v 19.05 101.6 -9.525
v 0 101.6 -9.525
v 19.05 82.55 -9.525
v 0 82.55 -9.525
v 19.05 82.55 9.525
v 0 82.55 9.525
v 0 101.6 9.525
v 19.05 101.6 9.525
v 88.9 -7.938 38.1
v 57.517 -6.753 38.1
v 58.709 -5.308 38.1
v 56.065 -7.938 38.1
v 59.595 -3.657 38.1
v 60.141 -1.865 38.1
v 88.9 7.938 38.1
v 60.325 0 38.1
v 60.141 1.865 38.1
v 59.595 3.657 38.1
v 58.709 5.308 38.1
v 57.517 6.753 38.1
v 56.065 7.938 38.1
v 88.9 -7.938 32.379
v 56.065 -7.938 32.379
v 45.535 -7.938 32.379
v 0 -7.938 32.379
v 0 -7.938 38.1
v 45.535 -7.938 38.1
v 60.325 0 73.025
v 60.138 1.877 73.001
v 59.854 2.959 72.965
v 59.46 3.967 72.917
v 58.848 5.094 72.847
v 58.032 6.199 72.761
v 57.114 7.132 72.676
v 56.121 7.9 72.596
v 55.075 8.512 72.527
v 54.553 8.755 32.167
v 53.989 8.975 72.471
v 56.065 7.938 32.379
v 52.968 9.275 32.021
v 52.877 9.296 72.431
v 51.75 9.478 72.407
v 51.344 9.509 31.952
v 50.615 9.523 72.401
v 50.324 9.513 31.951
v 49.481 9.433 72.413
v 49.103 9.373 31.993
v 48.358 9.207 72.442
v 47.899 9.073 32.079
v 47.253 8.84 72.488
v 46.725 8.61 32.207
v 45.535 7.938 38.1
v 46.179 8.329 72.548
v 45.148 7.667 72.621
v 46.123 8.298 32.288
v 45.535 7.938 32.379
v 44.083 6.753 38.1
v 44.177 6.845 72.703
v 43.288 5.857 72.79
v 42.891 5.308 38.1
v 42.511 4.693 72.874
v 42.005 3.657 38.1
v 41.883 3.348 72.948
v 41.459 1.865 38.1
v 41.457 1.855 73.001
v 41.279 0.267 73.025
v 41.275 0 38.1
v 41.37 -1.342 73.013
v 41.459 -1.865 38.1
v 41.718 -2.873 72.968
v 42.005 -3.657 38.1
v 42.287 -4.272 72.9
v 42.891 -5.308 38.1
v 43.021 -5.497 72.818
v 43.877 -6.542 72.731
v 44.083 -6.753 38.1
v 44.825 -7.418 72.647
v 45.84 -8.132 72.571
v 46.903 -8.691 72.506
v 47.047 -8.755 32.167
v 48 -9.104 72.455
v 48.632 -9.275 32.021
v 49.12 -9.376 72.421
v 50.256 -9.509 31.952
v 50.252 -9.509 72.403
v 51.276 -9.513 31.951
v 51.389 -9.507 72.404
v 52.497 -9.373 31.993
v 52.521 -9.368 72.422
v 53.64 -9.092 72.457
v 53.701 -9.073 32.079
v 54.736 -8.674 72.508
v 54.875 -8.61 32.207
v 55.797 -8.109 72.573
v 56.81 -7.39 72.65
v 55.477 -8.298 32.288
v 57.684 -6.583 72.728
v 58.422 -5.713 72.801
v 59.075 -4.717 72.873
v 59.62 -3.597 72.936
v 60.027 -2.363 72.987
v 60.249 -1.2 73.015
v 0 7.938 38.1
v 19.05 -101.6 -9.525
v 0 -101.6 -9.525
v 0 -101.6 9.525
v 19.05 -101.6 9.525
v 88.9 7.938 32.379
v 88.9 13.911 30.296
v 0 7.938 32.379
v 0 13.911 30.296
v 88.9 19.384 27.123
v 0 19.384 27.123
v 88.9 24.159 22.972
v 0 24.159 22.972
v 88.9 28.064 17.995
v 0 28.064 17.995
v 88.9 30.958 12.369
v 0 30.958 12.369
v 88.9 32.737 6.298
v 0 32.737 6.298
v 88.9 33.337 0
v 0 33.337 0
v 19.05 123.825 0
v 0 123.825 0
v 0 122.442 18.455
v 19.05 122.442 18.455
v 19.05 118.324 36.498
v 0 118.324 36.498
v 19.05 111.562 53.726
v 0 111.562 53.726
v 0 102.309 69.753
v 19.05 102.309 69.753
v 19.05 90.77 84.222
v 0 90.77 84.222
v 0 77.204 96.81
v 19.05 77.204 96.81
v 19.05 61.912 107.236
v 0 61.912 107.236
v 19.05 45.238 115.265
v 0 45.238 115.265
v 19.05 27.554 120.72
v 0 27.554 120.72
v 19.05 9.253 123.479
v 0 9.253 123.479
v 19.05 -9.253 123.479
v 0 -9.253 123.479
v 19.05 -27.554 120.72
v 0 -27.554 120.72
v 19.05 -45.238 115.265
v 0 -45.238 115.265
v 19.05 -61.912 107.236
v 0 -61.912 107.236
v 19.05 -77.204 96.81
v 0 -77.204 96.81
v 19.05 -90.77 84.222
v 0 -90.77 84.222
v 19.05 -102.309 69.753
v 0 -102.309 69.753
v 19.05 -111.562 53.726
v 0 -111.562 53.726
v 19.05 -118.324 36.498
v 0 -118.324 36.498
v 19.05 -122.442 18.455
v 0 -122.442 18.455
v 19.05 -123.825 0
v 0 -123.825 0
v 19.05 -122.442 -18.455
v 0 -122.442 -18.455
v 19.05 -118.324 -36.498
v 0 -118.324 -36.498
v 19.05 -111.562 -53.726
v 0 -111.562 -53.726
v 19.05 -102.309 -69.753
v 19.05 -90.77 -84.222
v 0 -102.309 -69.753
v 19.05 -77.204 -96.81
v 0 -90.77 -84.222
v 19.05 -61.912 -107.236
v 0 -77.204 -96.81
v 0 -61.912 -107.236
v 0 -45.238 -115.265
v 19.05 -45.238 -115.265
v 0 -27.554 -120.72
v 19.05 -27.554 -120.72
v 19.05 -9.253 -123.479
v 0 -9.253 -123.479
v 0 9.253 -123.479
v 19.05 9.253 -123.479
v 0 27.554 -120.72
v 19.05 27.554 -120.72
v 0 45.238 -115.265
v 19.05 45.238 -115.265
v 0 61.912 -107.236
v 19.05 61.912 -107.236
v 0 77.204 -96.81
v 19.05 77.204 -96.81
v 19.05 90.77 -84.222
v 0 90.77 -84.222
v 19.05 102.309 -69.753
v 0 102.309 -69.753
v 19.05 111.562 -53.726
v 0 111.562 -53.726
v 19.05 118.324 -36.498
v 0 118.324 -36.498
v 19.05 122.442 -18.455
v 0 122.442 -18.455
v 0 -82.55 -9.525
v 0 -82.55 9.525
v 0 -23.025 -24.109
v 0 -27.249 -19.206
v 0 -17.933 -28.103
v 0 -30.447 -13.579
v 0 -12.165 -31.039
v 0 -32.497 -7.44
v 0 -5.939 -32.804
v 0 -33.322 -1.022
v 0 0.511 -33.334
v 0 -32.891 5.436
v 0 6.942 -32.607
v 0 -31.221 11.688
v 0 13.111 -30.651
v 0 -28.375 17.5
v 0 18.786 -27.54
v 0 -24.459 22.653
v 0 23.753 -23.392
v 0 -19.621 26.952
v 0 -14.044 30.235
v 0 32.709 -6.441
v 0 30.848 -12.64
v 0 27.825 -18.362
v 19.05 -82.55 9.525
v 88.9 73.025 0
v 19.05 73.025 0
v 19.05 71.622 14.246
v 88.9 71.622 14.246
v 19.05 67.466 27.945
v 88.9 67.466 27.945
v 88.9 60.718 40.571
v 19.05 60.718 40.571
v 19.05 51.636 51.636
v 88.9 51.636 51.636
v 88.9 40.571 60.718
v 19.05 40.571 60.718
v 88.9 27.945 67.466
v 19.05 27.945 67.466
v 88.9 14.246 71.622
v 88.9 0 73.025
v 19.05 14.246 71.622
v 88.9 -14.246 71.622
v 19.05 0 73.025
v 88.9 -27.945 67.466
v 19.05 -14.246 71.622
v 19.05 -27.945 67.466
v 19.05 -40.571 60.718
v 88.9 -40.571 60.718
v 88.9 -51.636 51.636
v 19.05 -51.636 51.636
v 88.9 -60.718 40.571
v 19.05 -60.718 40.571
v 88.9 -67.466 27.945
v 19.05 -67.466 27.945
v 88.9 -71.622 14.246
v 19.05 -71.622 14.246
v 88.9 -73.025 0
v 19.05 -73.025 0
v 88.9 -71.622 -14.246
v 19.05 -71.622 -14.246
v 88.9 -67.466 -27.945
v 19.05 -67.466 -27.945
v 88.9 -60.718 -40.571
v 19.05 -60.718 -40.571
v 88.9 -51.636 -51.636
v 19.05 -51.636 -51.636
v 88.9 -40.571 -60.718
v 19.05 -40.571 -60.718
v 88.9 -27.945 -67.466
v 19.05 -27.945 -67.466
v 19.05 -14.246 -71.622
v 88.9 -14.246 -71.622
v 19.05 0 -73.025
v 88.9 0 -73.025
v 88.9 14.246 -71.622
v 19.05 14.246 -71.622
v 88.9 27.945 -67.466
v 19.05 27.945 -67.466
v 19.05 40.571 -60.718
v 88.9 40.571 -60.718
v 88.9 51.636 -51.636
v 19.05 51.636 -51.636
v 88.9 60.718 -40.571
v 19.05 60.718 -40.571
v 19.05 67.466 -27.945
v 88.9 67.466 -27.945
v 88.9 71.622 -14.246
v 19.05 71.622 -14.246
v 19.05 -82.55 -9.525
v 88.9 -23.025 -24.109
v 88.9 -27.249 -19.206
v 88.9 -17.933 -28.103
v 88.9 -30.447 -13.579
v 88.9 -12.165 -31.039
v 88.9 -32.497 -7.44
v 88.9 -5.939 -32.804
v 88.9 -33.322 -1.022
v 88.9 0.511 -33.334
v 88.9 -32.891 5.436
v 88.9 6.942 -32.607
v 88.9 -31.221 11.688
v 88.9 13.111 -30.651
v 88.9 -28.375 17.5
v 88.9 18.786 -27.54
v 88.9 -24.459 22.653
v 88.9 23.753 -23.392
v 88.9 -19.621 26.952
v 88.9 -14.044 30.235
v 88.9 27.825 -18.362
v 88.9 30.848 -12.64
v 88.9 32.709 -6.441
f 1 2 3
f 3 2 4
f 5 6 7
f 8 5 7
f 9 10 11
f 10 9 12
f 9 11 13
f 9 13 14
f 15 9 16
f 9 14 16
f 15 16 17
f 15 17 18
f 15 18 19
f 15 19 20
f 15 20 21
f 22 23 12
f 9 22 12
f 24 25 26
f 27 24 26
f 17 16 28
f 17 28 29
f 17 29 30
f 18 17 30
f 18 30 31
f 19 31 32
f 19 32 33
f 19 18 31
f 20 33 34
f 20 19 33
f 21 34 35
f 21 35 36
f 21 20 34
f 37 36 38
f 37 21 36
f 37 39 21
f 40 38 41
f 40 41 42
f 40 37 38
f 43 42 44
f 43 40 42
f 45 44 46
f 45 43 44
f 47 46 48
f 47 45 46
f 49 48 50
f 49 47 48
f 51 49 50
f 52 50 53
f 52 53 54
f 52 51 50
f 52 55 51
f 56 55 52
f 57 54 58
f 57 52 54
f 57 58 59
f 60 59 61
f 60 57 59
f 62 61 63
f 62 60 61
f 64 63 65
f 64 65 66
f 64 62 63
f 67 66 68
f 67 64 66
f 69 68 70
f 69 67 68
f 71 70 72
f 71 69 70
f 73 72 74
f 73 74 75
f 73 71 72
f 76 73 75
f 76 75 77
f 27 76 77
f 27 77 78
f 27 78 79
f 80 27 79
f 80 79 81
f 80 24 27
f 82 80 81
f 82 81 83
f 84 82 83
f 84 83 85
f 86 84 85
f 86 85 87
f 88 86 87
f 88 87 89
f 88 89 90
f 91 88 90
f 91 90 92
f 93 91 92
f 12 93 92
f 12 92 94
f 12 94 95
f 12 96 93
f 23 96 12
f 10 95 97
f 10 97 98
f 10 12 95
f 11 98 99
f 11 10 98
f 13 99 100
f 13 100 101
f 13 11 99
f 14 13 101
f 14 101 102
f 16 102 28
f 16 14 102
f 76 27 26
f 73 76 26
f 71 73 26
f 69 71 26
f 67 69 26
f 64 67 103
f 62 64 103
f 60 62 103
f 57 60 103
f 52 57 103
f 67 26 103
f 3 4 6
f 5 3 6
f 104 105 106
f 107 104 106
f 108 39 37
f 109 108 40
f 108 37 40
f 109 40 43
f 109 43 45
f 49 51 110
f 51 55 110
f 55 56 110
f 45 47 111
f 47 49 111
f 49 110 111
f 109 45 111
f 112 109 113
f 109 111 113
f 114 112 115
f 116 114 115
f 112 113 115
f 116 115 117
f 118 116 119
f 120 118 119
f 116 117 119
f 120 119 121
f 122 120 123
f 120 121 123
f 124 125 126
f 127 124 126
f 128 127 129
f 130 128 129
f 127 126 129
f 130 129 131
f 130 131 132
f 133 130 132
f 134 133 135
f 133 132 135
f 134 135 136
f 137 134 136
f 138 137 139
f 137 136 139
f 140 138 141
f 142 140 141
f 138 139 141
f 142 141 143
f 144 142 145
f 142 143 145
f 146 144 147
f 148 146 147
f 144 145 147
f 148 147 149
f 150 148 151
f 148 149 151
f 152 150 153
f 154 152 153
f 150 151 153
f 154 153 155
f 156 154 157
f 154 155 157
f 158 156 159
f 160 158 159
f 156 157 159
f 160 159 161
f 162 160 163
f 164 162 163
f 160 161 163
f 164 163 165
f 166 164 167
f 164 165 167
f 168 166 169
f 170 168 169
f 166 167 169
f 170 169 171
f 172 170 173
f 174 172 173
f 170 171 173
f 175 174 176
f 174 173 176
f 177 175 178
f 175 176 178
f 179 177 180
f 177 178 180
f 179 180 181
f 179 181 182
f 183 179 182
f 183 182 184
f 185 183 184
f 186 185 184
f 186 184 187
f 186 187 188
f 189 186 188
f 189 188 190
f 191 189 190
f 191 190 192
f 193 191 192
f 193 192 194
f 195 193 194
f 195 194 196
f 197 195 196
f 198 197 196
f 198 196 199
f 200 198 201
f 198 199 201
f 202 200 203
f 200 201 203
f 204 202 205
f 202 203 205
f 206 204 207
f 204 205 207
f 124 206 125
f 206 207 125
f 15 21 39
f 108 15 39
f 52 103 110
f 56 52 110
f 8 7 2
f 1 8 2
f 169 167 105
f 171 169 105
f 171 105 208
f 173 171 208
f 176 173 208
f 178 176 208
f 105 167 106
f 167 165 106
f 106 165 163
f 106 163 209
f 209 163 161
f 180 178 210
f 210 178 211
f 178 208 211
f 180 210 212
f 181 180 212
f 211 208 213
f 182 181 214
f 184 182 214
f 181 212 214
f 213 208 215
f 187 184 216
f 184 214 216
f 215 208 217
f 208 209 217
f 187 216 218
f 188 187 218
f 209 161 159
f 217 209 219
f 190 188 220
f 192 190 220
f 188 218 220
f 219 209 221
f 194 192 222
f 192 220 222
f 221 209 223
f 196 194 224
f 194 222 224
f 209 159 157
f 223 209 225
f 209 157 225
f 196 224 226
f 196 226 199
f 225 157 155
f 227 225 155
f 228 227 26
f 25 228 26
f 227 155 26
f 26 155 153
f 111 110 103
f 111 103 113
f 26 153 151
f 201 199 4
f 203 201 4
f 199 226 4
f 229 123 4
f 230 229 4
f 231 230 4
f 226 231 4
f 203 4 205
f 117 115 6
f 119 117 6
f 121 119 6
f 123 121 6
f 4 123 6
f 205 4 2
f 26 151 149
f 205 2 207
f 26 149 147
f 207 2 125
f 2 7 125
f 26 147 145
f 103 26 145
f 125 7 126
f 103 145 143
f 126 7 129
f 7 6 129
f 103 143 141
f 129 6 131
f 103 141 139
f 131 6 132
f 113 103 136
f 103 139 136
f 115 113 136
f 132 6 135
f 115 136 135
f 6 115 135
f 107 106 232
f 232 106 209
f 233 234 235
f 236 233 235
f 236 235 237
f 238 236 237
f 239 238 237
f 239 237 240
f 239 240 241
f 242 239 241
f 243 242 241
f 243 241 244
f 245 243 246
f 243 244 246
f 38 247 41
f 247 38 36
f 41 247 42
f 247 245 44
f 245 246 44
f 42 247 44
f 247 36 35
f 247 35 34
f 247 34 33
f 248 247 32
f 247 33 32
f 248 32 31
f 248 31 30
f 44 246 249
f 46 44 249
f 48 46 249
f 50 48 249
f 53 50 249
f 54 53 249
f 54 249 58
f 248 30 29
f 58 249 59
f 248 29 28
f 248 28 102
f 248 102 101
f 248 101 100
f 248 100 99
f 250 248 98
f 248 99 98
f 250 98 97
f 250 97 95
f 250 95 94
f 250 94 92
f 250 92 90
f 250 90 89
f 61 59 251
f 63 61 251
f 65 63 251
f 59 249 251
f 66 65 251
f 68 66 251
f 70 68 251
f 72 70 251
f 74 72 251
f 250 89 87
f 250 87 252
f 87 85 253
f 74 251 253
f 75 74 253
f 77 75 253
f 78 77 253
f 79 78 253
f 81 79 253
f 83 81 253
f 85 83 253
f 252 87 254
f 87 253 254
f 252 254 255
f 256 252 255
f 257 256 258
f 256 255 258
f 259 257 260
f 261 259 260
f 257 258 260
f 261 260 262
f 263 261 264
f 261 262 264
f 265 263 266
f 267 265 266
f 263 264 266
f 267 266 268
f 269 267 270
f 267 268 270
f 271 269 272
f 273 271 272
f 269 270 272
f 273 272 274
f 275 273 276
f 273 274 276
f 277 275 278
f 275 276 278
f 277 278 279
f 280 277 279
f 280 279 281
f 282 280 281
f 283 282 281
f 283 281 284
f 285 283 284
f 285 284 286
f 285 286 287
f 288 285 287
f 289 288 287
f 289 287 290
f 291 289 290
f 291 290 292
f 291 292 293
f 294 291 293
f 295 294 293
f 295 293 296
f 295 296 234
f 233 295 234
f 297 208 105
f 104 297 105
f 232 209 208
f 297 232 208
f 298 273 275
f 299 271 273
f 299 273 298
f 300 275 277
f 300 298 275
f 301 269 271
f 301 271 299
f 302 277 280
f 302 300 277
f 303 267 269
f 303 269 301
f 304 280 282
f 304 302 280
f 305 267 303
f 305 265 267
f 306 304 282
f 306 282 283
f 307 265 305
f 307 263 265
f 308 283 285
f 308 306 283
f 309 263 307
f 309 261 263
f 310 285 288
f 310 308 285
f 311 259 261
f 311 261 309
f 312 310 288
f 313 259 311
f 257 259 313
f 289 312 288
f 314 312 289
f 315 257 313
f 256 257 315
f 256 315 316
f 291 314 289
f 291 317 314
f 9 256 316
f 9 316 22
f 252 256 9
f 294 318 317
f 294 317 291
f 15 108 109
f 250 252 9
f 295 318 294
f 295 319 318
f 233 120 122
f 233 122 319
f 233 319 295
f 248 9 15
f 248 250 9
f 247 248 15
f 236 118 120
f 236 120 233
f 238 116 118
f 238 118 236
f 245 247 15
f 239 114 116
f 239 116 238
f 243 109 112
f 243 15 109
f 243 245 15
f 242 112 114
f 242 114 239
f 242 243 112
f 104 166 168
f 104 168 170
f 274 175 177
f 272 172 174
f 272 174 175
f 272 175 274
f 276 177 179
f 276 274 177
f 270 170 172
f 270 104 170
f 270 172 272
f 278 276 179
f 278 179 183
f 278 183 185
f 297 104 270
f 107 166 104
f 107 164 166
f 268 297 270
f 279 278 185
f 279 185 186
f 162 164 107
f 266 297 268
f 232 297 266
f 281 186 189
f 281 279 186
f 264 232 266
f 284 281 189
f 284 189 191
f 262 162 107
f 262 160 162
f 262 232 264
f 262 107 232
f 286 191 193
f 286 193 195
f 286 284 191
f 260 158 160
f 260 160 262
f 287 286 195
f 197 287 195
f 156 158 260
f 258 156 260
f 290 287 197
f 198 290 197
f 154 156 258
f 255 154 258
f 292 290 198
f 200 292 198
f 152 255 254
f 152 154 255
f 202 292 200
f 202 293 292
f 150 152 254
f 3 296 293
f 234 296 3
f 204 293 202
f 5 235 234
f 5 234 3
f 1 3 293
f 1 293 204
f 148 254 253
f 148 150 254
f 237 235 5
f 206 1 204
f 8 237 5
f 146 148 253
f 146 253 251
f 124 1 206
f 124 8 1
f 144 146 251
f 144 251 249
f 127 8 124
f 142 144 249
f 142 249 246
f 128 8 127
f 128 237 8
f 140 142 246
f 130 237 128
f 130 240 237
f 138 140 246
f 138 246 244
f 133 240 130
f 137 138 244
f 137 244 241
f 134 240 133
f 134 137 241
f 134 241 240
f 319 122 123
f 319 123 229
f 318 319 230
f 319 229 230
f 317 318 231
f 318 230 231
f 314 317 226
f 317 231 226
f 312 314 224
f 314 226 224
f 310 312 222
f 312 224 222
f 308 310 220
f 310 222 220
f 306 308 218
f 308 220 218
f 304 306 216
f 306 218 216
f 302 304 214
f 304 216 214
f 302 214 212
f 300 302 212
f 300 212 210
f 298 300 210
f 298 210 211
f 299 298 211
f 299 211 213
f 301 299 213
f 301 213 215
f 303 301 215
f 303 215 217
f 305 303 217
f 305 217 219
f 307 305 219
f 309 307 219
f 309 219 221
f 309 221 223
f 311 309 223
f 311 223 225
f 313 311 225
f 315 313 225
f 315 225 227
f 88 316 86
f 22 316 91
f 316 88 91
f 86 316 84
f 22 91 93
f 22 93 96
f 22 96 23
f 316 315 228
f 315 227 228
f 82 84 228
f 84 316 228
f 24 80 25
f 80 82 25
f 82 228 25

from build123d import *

# Parameters (mm, degrees)
F0_R     = 73.025
F1_DEPTH = 88.9
F0_R_2   = 123.825
F2_DEPTH = 19.05
F3_R     = 9.525
F4_DEPTH = 123.826


with BuildPart() as f1:
    # F0 (on Right) → F1 (new body)
    with BuildSketch(Plane.YZ):
        Circle(F0_R)
        with BuildLine():
            ThreePointArc((7.9375, 32.378774), (26.229805, 20.576352), (33.3375, 0))
            ThreePointArc((33.3375, 0), (-20.576352, -26.229805), (-7.9375, 32.378774))
            Line((-7.9375, 32.378774), (-7.9375, 38.1))
            Line((-7.9375, 38.1), (7.9375, 38.1))
            Line((7.9375, 38.1), (7.9375, 32.378774))
        make_face(mode=Mode.SUBTRACT)
    extrude(amount=F1_DEPTH)

    # F0 (on Right) → F2 (join)
    with BuildSketch(Plane.YZ):
        Circle(F0_R_2)
        Polygon((-101.6, -9.525), (-101.6, 9.525), (-82.55, 9.525), (-82.55, 0), (-82.55, -9.525), align=None, mode=Mode.SUBTRACT)
        Circle(F0_R, mode=Mode.SUBTRACT)
        Polygon((82.55, 0), (82.55, 9.525), (101.6, 9.525), (101.6, -9.525), (82.55, -9.525), align=None, mode=Mode.SUBTRACT)
    extrude(amount=F2_DEPTH)

    # F3 (on Top) → F4 (cut, through all)
    with BuildSketch(Plane.XY):
        with Locations((50.8, 0)):
            Circle(F3_R)
    extrude(amount=F4_DEPTH, mode=Mode.SUBTRACT)


solid = f1.part
